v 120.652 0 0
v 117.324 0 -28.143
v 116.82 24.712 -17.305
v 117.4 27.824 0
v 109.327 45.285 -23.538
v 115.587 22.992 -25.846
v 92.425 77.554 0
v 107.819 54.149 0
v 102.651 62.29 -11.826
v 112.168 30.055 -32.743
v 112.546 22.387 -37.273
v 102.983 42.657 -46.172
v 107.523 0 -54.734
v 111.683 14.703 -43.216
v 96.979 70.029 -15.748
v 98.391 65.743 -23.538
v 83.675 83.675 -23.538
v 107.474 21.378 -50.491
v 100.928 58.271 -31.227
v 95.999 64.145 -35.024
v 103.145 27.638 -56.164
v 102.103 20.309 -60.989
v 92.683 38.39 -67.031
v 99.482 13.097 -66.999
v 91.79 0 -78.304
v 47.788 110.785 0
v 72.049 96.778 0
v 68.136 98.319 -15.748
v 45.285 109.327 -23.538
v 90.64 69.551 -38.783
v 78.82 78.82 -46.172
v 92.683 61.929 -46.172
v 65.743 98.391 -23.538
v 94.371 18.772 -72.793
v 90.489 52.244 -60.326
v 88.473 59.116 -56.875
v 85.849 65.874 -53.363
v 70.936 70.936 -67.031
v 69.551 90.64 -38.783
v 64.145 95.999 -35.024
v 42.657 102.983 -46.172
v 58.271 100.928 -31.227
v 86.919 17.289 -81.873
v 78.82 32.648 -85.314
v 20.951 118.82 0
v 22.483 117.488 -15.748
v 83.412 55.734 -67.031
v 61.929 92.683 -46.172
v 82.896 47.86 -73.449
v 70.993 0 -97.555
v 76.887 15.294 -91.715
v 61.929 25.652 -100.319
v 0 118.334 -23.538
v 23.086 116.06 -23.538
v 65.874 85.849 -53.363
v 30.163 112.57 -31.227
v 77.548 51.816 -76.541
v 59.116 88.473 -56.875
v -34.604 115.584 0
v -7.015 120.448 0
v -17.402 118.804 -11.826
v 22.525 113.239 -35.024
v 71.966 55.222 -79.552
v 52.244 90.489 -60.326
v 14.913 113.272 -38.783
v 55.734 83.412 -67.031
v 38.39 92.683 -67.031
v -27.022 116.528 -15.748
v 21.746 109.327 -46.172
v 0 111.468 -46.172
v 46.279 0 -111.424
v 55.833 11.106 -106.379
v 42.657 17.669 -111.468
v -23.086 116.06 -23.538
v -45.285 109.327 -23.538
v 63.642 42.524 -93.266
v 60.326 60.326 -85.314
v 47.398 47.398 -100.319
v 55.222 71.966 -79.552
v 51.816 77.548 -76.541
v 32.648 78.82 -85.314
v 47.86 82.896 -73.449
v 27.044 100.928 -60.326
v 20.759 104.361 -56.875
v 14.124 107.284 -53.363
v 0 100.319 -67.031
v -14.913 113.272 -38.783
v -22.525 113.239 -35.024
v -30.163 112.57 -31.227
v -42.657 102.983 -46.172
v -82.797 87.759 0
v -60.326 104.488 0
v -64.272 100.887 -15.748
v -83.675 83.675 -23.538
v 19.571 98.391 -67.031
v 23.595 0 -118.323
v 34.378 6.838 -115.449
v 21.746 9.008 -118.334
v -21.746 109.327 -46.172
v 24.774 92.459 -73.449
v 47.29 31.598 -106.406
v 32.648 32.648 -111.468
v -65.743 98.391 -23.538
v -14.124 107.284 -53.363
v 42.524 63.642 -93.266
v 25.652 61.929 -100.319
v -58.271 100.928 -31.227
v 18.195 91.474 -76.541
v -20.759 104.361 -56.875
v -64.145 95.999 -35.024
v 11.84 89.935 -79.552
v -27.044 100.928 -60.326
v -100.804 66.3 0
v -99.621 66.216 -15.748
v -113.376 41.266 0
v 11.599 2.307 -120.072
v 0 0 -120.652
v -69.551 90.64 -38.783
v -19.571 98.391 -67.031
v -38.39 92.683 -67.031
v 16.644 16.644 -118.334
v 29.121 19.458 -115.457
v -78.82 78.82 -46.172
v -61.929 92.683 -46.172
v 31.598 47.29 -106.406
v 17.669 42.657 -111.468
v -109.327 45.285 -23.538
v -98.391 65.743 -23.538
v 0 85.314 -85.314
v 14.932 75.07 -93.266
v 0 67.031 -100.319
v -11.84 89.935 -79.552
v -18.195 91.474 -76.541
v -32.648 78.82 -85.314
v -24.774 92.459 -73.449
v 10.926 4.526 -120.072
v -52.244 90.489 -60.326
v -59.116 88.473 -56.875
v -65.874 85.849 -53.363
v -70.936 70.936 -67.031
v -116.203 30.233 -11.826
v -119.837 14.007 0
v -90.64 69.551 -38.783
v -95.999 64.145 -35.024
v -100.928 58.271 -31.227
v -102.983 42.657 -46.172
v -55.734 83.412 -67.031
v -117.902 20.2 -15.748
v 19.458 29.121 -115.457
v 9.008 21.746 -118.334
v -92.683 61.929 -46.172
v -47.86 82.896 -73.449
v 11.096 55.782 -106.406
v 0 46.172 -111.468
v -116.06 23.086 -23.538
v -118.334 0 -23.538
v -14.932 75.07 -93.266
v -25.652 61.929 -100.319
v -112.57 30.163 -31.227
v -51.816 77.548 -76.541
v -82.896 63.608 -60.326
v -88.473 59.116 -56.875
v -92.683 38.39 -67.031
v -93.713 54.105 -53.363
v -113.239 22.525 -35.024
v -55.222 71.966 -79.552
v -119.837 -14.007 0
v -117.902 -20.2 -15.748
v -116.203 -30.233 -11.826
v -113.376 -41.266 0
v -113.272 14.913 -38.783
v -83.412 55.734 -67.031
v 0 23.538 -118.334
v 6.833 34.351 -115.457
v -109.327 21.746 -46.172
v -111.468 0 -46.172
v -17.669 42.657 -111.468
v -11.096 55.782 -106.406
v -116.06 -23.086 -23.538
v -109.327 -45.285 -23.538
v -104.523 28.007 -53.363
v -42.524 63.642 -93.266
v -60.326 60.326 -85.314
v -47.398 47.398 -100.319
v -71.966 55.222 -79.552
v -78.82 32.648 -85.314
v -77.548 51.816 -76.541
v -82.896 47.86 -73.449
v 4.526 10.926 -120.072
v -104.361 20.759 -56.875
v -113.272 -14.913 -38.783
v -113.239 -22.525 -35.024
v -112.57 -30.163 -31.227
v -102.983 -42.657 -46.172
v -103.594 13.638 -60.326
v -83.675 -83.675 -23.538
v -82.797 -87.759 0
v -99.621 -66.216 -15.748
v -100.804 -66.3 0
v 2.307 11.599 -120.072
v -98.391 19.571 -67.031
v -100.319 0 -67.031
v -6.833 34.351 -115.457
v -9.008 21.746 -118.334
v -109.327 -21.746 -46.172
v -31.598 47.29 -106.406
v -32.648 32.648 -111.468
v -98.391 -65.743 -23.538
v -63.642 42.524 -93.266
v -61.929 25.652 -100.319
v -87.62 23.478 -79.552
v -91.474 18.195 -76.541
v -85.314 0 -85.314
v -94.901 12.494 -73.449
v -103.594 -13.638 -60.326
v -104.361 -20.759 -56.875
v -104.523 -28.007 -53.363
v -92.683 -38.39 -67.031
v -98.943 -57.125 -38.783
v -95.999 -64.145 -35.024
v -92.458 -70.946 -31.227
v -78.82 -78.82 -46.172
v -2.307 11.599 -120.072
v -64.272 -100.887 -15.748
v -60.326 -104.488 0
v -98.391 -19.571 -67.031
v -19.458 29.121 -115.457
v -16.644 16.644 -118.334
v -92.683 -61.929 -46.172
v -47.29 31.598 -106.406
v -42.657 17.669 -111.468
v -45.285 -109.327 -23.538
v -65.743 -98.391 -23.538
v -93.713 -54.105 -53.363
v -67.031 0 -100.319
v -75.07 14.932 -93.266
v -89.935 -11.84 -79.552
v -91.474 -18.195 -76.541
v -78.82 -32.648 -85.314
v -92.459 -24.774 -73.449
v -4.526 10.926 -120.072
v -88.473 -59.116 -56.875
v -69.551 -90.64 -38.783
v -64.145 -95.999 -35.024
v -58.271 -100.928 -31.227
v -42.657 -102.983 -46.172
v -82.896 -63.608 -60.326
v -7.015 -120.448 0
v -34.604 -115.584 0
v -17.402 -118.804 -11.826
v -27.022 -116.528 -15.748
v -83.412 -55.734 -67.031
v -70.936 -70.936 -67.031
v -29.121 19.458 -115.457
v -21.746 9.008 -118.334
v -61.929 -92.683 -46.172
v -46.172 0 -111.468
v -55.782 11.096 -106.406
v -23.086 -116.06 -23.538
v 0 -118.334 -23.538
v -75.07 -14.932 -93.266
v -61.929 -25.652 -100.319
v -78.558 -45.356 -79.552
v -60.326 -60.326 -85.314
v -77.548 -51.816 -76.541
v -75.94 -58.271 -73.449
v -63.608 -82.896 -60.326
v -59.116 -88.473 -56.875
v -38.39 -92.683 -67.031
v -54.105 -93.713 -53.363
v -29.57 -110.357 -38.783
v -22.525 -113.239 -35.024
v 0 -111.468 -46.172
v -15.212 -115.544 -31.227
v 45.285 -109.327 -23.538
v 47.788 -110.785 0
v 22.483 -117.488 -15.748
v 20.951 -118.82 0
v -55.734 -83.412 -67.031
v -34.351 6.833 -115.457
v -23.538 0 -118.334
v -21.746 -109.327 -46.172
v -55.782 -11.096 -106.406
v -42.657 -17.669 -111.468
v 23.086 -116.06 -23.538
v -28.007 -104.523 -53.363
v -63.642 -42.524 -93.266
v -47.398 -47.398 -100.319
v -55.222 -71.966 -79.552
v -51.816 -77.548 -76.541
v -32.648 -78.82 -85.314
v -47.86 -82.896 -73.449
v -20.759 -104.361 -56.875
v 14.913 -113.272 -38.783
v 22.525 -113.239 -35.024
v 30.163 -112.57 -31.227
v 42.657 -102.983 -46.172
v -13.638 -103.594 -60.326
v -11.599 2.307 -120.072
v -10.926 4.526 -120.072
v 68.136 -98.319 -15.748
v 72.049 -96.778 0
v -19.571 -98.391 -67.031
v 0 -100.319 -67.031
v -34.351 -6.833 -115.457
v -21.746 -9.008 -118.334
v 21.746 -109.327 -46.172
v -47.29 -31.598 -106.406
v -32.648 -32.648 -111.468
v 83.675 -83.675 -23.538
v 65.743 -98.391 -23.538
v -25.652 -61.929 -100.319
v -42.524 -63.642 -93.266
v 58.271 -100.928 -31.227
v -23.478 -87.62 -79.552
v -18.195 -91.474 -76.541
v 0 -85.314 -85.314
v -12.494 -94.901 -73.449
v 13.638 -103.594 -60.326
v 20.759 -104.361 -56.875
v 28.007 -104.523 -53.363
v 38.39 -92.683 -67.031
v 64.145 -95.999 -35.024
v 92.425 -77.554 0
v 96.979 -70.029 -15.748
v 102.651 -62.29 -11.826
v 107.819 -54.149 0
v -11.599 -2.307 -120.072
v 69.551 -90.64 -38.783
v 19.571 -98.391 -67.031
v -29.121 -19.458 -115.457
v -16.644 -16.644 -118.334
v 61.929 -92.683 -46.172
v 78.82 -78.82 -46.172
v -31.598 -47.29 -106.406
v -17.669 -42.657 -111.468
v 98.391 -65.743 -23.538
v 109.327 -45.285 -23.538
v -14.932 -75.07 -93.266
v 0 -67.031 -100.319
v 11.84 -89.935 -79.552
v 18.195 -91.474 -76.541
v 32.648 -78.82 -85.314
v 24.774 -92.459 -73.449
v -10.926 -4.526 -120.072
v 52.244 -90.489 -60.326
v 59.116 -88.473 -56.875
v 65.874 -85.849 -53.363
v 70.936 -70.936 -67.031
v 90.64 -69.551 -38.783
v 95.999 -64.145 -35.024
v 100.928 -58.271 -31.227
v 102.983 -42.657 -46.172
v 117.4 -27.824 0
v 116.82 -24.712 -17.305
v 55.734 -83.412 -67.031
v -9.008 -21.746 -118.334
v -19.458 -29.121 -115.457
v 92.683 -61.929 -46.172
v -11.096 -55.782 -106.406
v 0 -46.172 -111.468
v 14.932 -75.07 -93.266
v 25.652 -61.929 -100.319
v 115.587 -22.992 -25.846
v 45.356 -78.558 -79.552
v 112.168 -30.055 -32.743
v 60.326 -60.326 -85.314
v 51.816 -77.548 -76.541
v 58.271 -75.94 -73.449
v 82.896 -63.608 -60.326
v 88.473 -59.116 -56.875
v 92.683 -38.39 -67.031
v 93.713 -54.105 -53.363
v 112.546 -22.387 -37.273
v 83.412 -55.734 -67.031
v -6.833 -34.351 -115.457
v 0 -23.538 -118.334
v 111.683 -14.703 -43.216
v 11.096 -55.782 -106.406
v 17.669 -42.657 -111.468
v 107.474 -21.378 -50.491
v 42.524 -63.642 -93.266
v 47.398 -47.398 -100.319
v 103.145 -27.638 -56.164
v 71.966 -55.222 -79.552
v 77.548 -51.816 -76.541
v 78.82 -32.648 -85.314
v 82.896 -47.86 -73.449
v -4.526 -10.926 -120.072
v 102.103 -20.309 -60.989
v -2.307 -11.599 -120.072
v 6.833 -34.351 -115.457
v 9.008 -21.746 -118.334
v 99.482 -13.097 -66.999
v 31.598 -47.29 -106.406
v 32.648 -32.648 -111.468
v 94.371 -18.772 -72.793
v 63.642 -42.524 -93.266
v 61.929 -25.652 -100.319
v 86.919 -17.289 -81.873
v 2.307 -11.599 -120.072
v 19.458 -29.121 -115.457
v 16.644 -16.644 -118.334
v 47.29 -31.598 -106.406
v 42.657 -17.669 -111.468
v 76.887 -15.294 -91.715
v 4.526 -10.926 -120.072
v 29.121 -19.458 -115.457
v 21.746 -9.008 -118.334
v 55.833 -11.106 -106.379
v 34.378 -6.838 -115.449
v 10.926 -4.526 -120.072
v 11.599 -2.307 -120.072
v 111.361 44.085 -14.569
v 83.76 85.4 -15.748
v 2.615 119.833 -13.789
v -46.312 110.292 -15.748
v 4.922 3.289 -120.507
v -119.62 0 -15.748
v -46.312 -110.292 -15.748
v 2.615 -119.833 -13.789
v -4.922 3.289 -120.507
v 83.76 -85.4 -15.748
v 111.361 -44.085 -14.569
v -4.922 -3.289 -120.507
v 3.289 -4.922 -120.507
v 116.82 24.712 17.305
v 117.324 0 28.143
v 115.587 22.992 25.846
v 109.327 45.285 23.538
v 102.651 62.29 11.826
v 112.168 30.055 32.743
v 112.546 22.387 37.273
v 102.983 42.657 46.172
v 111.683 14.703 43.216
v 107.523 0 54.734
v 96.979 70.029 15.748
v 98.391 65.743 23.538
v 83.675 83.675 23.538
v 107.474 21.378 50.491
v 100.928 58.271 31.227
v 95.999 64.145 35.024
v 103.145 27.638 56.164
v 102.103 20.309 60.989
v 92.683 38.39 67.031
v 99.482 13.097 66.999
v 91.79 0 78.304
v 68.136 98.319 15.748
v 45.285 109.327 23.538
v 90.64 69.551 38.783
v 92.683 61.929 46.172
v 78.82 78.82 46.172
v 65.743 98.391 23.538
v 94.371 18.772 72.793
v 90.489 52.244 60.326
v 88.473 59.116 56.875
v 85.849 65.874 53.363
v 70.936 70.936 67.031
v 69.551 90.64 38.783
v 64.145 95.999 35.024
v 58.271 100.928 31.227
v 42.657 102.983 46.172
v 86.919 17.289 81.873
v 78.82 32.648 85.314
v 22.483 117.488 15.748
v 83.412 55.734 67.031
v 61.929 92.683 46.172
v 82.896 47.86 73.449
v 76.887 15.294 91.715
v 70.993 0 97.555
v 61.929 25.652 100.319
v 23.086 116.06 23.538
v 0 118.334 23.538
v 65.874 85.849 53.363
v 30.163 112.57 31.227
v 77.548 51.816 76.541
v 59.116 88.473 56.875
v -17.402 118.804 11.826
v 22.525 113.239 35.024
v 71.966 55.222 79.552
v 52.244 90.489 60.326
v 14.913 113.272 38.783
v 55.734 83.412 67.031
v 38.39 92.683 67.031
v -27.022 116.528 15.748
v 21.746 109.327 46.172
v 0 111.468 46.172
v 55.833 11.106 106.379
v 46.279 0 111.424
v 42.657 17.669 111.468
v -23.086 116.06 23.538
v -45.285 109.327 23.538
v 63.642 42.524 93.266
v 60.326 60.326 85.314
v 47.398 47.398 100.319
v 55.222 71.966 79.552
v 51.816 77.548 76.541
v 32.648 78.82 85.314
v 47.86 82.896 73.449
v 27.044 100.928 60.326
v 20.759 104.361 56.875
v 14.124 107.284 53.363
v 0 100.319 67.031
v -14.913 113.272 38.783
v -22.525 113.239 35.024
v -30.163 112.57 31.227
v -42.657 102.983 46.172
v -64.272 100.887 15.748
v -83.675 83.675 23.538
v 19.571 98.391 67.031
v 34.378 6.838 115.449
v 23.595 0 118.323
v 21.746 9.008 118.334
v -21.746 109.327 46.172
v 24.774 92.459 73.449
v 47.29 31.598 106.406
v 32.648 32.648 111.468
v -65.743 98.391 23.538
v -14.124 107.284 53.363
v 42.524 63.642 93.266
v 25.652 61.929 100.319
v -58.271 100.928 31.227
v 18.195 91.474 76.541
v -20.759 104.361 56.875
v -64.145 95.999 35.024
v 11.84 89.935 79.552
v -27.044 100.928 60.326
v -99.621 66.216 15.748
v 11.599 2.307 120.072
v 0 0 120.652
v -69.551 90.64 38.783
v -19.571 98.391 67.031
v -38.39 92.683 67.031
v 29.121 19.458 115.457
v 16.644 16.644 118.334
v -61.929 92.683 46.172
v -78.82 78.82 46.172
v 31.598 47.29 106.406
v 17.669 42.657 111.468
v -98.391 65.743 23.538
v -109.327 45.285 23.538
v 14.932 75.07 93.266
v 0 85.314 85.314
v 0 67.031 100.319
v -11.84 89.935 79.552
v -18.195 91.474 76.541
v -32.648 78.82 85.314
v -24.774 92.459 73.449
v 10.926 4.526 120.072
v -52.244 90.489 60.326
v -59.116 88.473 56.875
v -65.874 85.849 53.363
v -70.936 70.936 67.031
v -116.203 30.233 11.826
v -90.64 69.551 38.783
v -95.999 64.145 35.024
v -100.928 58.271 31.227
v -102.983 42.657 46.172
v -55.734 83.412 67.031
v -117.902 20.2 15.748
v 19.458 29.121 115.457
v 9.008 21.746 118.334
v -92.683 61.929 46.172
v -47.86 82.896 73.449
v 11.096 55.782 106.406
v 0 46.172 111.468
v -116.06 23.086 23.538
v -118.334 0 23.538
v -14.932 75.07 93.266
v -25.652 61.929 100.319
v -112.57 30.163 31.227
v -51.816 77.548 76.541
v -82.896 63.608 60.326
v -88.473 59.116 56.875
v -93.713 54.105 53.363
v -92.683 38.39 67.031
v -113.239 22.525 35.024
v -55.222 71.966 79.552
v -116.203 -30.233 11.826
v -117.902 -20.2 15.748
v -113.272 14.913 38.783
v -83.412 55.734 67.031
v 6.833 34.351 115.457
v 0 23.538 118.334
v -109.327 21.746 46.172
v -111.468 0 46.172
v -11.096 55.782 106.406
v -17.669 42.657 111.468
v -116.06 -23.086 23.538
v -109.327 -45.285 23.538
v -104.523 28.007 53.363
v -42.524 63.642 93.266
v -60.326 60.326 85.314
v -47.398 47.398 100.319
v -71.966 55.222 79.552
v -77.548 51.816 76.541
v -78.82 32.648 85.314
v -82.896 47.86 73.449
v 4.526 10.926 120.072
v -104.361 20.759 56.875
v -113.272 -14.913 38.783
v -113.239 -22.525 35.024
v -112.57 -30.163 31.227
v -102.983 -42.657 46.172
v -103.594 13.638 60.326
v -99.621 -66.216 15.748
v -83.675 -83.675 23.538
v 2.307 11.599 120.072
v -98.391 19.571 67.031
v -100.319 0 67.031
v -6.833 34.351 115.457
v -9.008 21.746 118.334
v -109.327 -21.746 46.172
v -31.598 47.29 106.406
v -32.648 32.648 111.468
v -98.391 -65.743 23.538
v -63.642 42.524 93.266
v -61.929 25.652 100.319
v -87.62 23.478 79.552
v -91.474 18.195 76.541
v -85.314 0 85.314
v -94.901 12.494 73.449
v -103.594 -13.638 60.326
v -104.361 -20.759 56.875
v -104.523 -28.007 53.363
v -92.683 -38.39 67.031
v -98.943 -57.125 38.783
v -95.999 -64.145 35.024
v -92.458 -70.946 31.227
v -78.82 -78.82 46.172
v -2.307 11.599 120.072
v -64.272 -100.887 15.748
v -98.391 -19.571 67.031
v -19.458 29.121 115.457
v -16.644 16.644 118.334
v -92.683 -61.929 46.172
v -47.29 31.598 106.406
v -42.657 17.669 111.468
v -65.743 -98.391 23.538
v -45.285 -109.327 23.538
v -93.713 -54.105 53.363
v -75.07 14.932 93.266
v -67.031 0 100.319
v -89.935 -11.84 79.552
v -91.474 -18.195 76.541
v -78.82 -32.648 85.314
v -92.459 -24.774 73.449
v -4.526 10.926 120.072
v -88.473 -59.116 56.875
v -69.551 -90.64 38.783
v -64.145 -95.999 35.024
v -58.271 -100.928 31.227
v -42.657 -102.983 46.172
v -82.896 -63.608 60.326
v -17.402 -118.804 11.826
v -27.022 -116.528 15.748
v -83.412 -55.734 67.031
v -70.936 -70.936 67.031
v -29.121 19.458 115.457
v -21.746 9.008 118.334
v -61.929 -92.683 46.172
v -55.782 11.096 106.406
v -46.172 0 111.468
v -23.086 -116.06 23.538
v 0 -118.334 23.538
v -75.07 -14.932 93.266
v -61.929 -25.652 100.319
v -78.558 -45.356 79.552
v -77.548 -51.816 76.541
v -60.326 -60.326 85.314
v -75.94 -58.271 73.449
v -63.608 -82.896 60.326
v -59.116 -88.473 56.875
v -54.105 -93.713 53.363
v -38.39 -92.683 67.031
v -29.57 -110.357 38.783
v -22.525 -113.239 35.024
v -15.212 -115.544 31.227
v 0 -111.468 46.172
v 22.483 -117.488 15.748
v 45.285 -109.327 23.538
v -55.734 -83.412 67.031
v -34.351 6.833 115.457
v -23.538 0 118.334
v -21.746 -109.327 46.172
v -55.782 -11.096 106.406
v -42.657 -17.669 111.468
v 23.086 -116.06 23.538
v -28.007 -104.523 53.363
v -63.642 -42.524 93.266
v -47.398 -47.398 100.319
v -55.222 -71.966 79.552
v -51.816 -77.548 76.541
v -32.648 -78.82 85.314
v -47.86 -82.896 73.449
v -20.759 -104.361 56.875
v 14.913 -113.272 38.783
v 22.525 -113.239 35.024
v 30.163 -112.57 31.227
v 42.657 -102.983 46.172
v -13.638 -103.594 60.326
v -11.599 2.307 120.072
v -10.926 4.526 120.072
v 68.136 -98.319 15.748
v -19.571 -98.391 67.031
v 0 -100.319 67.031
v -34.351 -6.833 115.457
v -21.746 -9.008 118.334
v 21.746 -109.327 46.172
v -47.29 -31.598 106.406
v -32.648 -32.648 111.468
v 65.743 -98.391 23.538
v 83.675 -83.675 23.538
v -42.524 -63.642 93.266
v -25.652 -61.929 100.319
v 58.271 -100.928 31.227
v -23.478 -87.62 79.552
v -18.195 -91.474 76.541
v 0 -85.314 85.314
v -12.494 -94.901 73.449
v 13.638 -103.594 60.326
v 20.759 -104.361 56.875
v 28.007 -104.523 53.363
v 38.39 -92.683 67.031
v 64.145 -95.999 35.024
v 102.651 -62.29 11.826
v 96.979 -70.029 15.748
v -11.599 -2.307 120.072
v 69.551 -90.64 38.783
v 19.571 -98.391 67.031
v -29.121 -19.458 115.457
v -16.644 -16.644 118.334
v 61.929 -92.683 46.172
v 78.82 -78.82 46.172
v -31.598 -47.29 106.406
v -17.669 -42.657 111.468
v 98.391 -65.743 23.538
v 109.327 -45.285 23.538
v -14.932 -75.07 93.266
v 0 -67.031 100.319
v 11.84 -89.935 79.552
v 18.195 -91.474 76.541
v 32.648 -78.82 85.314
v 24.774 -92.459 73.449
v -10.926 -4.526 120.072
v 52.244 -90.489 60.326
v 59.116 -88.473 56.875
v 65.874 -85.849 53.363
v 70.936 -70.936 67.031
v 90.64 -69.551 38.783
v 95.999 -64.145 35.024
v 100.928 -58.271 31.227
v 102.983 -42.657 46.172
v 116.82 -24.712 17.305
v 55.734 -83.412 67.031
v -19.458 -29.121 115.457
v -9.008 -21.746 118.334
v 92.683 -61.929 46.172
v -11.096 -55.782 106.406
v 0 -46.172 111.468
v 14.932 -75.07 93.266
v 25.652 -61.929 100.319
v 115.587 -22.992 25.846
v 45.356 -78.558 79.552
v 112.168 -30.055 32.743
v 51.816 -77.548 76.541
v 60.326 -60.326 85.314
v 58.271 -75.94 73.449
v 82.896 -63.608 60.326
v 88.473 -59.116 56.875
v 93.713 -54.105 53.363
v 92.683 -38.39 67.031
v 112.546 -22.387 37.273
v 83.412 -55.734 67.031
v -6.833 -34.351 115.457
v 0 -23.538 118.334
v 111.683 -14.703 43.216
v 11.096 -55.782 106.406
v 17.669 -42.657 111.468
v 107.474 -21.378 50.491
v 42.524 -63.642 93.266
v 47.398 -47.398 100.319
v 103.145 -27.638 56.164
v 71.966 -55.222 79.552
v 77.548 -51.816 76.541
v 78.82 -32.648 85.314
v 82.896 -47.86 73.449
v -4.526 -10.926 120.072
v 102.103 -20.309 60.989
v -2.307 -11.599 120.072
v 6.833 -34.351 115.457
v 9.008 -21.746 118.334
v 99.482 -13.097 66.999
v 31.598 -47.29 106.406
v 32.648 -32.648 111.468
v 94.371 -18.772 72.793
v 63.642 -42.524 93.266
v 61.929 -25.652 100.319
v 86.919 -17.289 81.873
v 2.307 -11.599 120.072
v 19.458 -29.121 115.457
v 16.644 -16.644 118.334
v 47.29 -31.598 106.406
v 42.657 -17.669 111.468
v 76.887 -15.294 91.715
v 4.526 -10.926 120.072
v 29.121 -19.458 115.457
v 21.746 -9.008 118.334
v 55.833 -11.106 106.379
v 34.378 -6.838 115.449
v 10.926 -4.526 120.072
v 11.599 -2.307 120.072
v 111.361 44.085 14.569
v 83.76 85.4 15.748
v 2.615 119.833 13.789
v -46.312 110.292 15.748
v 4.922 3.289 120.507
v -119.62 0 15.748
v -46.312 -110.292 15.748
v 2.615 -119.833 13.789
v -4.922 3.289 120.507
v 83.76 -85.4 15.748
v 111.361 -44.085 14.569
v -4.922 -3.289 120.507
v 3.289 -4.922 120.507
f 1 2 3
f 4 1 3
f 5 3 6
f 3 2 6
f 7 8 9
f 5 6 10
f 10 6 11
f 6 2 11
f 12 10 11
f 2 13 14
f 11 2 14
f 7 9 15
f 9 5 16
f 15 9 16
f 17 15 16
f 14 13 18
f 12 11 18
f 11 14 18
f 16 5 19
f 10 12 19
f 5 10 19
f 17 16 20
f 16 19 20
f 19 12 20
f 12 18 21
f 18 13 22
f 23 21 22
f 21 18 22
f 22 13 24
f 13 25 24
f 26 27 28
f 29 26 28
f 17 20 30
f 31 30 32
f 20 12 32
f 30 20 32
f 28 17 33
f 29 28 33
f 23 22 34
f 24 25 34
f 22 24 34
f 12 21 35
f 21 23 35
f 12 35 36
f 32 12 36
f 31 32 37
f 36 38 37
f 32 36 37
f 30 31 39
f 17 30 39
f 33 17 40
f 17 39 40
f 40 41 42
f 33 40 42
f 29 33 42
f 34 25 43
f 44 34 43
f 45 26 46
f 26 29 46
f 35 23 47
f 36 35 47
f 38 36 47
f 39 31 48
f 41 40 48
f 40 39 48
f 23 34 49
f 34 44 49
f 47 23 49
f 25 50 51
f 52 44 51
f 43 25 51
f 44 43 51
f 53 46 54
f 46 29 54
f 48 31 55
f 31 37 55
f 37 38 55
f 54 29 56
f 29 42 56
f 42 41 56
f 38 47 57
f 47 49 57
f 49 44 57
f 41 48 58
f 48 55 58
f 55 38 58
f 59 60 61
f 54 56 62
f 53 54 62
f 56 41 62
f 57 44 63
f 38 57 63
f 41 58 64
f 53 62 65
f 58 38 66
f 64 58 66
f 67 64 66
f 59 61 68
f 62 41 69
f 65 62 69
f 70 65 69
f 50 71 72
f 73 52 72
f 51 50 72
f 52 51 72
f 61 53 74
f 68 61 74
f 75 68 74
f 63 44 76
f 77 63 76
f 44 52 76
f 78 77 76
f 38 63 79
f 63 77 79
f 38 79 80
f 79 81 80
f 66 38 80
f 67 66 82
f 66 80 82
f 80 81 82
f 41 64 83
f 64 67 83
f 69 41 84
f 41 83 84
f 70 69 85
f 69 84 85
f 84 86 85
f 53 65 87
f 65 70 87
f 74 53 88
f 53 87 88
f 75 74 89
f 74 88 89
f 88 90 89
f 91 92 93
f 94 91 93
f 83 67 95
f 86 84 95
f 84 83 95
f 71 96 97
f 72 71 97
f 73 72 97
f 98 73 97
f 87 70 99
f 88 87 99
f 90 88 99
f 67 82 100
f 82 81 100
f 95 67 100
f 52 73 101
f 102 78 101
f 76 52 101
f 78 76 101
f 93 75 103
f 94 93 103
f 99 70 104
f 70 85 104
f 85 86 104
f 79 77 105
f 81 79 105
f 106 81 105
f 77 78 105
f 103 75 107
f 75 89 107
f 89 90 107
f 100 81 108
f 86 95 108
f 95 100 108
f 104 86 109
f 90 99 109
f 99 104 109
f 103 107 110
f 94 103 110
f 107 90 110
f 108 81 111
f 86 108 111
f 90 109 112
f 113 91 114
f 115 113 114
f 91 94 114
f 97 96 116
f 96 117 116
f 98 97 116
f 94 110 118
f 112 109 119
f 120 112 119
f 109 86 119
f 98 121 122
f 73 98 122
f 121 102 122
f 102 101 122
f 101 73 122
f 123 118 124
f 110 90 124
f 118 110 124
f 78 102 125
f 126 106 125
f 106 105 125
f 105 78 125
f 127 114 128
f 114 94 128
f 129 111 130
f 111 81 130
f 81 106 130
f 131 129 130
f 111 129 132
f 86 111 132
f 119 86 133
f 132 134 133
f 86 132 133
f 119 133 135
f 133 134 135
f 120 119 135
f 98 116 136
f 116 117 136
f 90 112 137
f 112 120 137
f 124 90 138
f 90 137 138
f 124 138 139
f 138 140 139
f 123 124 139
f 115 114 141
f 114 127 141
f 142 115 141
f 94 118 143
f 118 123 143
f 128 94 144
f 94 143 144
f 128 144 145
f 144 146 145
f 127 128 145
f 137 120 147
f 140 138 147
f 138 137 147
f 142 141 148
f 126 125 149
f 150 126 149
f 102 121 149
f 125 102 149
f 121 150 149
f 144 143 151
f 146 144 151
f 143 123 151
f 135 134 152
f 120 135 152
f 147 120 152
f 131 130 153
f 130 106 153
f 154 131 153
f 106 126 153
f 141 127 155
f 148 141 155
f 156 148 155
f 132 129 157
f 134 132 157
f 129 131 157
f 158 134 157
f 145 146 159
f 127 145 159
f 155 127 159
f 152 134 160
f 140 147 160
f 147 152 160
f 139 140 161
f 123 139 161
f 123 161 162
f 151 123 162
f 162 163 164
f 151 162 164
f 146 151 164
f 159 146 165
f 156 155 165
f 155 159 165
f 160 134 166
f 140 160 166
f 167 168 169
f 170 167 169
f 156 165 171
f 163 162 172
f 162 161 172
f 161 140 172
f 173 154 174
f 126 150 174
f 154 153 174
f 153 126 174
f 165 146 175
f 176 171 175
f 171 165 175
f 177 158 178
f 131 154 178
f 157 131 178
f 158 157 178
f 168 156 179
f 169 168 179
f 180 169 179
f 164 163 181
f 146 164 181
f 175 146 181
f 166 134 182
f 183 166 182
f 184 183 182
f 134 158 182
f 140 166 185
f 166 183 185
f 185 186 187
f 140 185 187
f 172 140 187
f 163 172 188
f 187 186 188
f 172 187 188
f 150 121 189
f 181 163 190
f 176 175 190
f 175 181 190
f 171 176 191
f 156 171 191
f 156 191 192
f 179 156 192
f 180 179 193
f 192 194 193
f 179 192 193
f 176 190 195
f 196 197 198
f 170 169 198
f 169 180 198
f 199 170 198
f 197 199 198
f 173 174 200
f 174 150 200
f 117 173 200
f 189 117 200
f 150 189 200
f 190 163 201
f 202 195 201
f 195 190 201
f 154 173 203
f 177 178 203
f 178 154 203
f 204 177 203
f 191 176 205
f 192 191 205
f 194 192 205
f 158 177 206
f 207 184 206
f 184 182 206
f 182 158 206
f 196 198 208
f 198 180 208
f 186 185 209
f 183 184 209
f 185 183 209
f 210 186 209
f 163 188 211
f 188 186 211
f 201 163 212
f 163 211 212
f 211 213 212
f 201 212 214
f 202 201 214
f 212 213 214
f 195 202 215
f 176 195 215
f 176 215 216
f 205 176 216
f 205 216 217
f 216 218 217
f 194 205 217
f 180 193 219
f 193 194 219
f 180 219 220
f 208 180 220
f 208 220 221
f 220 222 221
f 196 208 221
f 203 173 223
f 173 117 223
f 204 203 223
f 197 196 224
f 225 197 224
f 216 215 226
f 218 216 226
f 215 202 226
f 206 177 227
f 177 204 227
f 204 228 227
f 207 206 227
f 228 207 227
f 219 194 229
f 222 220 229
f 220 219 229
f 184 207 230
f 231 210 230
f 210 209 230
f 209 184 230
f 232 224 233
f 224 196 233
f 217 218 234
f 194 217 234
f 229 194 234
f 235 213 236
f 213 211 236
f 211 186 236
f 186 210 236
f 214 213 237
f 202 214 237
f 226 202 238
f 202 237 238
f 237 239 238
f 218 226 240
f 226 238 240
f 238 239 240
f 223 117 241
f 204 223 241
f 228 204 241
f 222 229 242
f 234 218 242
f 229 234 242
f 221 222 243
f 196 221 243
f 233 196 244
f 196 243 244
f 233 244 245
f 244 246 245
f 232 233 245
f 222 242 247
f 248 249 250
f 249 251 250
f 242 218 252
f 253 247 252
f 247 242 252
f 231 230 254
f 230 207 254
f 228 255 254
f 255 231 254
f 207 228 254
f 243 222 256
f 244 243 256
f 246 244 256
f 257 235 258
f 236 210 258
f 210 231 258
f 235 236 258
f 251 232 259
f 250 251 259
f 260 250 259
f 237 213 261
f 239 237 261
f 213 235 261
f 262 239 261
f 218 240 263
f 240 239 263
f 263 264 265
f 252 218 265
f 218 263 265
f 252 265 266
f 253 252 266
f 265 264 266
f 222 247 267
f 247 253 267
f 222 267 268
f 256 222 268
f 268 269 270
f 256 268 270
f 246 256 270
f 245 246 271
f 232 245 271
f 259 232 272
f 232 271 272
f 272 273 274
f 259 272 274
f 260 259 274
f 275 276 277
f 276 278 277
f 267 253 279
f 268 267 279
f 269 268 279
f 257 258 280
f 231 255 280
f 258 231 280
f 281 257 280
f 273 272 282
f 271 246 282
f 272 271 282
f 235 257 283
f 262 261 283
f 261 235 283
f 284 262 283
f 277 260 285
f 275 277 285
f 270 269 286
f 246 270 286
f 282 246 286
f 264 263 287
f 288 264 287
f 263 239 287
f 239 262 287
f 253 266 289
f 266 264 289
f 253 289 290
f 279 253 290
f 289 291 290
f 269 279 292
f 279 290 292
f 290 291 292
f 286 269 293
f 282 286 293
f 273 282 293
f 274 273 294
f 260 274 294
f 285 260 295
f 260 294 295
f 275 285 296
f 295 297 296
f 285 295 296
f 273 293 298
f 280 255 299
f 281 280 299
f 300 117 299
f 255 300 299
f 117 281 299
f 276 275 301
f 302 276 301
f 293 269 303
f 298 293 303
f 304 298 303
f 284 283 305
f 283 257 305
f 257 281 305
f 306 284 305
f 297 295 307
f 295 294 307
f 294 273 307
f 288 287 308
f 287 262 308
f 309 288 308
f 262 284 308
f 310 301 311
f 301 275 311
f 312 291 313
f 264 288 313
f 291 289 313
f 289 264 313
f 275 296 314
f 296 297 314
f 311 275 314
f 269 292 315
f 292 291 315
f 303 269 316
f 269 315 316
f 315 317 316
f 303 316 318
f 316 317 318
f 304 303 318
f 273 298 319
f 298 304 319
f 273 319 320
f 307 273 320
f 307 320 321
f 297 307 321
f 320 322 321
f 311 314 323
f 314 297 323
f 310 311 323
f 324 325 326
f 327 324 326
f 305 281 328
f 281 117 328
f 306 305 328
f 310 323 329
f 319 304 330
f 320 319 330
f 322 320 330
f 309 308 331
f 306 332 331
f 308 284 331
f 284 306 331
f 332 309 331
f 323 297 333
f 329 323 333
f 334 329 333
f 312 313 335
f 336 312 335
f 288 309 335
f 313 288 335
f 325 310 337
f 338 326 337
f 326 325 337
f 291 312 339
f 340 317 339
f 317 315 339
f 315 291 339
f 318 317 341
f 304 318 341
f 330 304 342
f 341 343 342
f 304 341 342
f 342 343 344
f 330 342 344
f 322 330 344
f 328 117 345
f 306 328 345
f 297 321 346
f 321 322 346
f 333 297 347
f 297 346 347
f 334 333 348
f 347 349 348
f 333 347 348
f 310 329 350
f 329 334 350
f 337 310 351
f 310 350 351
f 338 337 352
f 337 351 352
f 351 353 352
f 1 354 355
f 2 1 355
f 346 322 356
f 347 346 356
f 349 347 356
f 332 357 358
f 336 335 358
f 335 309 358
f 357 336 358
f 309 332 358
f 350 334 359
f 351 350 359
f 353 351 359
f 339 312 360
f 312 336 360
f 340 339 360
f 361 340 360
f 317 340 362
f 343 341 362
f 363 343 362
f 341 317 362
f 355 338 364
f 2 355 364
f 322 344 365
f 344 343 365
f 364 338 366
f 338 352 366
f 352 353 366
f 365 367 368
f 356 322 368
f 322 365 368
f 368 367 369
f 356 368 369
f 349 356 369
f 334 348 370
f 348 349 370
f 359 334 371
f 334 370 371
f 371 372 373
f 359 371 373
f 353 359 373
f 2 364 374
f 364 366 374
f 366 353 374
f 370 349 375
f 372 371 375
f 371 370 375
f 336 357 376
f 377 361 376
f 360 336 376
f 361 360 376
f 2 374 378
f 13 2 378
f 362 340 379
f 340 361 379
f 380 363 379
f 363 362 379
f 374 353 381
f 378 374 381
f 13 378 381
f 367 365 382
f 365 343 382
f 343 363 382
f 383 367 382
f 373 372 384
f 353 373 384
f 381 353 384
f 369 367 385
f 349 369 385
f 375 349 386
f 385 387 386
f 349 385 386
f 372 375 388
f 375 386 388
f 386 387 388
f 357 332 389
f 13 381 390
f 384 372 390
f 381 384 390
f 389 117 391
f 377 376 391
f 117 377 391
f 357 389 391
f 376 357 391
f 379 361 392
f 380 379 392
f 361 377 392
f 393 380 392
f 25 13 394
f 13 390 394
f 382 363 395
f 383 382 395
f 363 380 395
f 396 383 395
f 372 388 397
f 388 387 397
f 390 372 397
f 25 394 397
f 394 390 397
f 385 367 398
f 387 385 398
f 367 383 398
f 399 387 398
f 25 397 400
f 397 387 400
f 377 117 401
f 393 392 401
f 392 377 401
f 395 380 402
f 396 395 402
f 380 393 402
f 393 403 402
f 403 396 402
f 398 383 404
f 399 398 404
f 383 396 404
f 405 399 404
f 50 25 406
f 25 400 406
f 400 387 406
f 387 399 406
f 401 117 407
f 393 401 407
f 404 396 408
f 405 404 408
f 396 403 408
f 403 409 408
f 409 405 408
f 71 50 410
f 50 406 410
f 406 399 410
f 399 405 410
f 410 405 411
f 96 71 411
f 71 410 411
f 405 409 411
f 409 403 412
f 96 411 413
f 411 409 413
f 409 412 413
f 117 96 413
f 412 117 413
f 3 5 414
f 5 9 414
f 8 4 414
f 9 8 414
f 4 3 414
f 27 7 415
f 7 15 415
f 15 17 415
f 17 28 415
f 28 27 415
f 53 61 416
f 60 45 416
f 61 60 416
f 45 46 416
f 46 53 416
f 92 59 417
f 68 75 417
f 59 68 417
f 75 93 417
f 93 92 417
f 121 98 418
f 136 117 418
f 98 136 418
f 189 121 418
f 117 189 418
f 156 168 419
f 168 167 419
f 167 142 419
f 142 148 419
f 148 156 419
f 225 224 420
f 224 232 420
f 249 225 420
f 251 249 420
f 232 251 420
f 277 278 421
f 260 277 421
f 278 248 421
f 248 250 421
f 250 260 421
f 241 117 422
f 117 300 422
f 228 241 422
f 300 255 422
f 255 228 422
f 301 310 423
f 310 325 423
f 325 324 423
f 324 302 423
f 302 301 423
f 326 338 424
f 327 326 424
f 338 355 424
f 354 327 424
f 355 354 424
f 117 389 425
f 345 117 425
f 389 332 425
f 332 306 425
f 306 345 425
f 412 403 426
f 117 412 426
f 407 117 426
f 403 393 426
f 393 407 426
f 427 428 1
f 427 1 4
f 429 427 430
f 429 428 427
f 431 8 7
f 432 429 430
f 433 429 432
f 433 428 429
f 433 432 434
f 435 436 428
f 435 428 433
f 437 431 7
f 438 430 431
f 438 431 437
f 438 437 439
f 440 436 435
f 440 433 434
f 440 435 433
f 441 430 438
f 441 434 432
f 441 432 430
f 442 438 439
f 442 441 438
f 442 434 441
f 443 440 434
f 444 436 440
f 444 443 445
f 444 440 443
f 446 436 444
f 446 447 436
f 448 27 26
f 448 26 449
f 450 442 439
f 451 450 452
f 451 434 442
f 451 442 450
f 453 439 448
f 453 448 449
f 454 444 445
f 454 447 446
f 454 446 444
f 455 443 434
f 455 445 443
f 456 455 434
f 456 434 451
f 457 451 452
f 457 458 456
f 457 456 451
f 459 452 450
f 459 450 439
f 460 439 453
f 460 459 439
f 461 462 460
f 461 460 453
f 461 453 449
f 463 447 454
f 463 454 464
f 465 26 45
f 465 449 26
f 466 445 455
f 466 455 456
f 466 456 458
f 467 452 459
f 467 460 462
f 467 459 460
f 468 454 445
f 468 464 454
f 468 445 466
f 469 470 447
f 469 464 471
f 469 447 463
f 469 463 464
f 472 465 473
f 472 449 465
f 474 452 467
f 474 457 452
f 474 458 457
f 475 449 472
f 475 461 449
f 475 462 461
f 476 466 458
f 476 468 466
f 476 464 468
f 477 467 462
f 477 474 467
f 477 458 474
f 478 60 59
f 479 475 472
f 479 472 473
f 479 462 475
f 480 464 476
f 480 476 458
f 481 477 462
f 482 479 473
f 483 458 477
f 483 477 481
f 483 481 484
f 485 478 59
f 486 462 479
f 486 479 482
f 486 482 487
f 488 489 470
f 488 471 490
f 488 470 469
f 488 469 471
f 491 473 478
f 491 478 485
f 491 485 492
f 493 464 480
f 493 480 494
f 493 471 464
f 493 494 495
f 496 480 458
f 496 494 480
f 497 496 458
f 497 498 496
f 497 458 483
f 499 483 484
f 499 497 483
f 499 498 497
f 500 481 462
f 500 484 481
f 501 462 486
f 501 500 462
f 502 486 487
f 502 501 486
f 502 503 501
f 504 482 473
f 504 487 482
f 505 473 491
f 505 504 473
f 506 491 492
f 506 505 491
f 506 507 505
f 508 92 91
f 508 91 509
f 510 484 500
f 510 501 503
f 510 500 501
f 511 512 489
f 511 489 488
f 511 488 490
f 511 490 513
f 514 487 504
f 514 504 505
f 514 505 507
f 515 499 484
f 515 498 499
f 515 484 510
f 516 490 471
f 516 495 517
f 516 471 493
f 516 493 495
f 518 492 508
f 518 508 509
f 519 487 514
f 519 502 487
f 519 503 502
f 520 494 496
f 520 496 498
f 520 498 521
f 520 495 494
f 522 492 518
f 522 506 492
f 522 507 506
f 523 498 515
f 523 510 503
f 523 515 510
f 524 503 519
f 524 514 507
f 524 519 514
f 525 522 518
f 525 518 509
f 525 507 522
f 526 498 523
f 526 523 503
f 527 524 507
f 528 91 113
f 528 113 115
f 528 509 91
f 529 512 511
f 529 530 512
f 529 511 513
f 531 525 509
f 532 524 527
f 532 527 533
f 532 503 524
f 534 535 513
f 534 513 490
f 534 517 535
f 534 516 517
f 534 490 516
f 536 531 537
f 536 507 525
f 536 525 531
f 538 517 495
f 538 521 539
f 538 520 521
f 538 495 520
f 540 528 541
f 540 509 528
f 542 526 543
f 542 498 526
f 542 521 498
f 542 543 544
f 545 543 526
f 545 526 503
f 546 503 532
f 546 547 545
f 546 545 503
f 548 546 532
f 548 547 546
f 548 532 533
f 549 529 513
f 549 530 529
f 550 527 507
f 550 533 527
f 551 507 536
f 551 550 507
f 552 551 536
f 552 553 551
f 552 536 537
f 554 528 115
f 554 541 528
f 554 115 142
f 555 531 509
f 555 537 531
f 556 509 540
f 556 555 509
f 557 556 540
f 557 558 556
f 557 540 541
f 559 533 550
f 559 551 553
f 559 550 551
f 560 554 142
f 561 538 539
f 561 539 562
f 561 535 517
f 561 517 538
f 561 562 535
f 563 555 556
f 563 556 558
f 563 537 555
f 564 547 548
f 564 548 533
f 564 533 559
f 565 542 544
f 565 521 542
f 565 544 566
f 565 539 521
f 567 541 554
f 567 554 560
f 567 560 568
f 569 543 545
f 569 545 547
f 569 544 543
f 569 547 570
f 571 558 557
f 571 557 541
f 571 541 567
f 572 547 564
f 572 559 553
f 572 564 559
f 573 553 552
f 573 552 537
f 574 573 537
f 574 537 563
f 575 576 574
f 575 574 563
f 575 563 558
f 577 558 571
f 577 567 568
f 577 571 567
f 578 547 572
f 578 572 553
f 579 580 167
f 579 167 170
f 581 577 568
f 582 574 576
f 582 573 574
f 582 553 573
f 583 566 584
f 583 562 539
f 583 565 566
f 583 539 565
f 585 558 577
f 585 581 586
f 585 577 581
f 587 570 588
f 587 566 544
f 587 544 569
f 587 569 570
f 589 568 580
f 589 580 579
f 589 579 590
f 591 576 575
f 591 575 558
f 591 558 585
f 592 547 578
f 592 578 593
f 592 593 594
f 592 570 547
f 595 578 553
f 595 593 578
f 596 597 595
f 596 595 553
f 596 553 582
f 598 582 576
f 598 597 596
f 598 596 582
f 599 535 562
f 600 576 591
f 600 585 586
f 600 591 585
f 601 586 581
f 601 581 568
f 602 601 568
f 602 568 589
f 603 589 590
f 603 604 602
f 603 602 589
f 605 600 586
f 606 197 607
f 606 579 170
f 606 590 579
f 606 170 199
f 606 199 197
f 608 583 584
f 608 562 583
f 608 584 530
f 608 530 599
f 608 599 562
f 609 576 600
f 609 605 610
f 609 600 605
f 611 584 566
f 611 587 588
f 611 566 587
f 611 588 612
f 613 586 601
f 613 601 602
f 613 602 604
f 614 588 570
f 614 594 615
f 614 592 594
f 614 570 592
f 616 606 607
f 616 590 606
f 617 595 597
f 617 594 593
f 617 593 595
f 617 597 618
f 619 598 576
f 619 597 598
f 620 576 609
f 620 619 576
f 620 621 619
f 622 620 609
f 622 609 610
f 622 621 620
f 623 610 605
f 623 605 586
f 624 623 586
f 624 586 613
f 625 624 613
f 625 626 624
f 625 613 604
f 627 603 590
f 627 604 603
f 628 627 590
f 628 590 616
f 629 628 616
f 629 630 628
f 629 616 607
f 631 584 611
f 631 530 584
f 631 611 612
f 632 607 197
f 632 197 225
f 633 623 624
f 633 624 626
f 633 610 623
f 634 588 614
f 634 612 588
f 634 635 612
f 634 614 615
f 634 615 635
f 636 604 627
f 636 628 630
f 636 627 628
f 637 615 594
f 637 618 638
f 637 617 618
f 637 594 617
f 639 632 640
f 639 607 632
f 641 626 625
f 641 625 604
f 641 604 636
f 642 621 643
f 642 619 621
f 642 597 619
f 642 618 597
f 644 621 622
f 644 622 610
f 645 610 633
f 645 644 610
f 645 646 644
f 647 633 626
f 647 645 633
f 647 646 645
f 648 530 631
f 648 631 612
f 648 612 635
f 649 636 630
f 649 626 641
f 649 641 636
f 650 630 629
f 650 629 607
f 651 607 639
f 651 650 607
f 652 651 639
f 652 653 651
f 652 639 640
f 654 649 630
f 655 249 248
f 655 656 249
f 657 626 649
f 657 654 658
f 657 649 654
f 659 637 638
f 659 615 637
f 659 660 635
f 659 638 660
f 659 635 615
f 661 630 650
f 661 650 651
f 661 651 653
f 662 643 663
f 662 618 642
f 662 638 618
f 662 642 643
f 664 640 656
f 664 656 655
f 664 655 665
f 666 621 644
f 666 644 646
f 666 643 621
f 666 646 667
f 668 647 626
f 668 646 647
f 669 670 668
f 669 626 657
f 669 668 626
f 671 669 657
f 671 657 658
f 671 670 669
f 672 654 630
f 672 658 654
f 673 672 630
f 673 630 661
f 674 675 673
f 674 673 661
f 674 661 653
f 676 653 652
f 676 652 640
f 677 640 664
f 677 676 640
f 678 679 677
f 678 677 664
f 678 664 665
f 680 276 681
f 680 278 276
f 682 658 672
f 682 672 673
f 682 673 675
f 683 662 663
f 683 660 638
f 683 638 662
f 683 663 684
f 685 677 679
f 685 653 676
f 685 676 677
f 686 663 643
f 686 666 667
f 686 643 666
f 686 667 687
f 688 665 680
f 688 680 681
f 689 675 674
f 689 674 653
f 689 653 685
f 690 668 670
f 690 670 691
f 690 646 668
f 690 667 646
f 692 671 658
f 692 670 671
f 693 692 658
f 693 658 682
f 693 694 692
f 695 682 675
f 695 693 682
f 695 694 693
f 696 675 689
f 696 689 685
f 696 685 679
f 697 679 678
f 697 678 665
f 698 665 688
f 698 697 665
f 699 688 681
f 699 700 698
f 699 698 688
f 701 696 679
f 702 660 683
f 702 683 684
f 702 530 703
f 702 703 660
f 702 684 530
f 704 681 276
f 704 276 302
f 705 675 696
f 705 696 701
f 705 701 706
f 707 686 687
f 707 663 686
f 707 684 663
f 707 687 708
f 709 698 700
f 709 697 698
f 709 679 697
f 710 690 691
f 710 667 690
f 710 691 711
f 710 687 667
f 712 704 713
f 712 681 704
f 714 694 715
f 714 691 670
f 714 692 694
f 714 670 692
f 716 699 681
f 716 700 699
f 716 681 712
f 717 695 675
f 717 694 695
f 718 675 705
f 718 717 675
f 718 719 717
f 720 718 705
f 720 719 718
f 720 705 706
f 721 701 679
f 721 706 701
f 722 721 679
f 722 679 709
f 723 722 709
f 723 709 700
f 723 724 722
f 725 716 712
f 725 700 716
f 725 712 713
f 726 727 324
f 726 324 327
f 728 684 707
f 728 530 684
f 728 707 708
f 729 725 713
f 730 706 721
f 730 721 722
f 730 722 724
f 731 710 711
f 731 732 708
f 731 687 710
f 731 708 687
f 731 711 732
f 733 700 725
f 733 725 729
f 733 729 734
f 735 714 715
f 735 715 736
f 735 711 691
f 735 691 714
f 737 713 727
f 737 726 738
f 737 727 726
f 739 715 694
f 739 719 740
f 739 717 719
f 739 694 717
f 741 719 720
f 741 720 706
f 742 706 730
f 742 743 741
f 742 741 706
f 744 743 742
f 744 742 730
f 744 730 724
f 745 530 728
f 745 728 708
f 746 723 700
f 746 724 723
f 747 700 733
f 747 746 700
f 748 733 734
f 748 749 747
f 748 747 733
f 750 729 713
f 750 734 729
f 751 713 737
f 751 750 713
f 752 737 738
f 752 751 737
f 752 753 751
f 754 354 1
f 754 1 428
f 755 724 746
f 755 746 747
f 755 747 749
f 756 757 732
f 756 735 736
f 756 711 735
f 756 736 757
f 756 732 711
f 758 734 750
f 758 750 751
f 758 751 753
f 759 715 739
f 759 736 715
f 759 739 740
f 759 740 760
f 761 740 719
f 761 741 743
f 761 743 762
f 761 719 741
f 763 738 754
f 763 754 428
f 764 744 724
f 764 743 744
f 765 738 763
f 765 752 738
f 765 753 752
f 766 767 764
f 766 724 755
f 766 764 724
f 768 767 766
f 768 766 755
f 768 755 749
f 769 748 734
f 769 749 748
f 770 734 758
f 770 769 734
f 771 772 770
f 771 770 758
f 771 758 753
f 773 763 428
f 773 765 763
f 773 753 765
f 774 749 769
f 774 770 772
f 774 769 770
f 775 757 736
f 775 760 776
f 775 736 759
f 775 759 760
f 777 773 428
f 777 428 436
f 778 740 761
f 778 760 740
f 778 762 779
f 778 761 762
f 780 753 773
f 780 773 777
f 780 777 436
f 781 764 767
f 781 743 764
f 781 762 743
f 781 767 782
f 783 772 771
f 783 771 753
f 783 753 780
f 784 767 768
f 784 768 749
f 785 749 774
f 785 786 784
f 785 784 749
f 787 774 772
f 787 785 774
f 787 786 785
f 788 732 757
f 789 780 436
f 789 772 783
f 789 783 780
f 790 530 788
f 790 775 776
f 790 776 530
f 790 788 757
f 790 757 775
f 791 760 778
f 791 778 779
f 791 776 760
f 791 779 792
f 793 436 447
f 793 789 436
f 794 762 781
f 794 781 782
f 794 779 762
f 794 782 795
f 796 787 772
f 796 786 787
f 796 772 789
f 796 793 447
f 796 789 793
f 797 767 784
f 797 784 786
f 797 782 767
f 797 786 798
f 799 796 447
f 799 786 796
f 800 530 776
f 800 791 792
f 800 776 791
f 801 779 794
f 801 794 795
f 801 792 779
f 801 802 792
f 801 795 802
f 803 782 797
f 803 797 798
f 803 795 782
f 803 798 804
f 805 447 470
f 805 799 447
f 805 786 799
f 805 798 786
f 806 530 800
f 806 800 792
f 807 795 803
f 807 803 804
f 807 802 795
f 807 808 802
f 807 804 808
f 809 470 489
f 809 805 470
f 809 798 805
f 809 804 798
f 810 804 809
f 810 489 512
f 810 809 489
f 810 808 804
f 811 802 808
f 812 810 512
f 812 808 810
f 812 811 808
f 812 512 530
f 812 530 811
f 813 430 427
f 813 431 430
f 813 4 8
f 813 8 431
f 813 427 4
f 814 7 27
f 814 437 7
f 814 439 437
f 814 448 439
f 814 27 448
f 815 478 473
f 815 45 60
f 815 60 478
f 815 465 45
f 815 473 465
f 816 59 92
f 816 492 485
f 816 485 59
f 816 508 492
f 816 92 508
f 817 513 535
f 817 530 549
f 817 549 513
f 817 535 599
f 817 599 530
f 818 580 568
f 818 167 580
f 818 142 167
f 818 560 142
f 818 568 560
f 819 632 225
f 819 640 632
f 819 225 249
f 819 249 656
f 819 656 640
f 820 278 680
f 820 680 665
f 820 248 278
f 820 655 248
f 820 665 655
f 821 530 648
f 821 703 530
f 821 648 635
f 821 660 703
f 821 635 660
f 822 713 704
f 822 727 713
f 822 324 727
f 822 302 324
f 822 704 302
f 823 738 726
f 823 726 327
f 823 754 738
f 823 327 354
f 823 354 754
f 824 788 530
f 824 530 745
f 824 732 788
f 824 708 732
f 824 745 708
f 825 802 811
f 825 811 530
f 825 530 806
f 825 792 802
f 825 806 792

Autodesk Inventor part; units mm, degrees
ref_plane "YZ Plane" through (0, 0, 0) normal (1, 0, 0) x (0, 1, 0)
ref_plane "XZ Plane" through (0, 0, 0) normal (0, 1, 0) x (-1, 0, 0)
ref_plane "XY Plane" through (0, 0, 0) normal (0, 0, 1) x (1, 0, 0)
sketch "Sketch1" plane through (0, 0, 0) normal (0, 0, 1) x (1, 0, 0)
  circle A0 centre (0, 0) radius 120.65
  dimension "d0" = 241.3
extrude "Extrusion1" add sketch "Sketch1" along normal mid plane 241.3
fillet "Fillet1" radius 120.65 2 edges at (-120.65, 0, 120.65) (-120.65, 0, -120.65)
thicken "Thicken1" operation add thickness 0.0025 both sides no extend neighbours yes toward (-0.5, -0.8660254, 0) faces at (-60.325, -104.486, 0.0001) (-60.2761, -104.4012, 4.8582) (-60.325, -104.486, -0.0001) (0, 0, 120.65)
properties part number "2022 Cargo" material "Rubber"
